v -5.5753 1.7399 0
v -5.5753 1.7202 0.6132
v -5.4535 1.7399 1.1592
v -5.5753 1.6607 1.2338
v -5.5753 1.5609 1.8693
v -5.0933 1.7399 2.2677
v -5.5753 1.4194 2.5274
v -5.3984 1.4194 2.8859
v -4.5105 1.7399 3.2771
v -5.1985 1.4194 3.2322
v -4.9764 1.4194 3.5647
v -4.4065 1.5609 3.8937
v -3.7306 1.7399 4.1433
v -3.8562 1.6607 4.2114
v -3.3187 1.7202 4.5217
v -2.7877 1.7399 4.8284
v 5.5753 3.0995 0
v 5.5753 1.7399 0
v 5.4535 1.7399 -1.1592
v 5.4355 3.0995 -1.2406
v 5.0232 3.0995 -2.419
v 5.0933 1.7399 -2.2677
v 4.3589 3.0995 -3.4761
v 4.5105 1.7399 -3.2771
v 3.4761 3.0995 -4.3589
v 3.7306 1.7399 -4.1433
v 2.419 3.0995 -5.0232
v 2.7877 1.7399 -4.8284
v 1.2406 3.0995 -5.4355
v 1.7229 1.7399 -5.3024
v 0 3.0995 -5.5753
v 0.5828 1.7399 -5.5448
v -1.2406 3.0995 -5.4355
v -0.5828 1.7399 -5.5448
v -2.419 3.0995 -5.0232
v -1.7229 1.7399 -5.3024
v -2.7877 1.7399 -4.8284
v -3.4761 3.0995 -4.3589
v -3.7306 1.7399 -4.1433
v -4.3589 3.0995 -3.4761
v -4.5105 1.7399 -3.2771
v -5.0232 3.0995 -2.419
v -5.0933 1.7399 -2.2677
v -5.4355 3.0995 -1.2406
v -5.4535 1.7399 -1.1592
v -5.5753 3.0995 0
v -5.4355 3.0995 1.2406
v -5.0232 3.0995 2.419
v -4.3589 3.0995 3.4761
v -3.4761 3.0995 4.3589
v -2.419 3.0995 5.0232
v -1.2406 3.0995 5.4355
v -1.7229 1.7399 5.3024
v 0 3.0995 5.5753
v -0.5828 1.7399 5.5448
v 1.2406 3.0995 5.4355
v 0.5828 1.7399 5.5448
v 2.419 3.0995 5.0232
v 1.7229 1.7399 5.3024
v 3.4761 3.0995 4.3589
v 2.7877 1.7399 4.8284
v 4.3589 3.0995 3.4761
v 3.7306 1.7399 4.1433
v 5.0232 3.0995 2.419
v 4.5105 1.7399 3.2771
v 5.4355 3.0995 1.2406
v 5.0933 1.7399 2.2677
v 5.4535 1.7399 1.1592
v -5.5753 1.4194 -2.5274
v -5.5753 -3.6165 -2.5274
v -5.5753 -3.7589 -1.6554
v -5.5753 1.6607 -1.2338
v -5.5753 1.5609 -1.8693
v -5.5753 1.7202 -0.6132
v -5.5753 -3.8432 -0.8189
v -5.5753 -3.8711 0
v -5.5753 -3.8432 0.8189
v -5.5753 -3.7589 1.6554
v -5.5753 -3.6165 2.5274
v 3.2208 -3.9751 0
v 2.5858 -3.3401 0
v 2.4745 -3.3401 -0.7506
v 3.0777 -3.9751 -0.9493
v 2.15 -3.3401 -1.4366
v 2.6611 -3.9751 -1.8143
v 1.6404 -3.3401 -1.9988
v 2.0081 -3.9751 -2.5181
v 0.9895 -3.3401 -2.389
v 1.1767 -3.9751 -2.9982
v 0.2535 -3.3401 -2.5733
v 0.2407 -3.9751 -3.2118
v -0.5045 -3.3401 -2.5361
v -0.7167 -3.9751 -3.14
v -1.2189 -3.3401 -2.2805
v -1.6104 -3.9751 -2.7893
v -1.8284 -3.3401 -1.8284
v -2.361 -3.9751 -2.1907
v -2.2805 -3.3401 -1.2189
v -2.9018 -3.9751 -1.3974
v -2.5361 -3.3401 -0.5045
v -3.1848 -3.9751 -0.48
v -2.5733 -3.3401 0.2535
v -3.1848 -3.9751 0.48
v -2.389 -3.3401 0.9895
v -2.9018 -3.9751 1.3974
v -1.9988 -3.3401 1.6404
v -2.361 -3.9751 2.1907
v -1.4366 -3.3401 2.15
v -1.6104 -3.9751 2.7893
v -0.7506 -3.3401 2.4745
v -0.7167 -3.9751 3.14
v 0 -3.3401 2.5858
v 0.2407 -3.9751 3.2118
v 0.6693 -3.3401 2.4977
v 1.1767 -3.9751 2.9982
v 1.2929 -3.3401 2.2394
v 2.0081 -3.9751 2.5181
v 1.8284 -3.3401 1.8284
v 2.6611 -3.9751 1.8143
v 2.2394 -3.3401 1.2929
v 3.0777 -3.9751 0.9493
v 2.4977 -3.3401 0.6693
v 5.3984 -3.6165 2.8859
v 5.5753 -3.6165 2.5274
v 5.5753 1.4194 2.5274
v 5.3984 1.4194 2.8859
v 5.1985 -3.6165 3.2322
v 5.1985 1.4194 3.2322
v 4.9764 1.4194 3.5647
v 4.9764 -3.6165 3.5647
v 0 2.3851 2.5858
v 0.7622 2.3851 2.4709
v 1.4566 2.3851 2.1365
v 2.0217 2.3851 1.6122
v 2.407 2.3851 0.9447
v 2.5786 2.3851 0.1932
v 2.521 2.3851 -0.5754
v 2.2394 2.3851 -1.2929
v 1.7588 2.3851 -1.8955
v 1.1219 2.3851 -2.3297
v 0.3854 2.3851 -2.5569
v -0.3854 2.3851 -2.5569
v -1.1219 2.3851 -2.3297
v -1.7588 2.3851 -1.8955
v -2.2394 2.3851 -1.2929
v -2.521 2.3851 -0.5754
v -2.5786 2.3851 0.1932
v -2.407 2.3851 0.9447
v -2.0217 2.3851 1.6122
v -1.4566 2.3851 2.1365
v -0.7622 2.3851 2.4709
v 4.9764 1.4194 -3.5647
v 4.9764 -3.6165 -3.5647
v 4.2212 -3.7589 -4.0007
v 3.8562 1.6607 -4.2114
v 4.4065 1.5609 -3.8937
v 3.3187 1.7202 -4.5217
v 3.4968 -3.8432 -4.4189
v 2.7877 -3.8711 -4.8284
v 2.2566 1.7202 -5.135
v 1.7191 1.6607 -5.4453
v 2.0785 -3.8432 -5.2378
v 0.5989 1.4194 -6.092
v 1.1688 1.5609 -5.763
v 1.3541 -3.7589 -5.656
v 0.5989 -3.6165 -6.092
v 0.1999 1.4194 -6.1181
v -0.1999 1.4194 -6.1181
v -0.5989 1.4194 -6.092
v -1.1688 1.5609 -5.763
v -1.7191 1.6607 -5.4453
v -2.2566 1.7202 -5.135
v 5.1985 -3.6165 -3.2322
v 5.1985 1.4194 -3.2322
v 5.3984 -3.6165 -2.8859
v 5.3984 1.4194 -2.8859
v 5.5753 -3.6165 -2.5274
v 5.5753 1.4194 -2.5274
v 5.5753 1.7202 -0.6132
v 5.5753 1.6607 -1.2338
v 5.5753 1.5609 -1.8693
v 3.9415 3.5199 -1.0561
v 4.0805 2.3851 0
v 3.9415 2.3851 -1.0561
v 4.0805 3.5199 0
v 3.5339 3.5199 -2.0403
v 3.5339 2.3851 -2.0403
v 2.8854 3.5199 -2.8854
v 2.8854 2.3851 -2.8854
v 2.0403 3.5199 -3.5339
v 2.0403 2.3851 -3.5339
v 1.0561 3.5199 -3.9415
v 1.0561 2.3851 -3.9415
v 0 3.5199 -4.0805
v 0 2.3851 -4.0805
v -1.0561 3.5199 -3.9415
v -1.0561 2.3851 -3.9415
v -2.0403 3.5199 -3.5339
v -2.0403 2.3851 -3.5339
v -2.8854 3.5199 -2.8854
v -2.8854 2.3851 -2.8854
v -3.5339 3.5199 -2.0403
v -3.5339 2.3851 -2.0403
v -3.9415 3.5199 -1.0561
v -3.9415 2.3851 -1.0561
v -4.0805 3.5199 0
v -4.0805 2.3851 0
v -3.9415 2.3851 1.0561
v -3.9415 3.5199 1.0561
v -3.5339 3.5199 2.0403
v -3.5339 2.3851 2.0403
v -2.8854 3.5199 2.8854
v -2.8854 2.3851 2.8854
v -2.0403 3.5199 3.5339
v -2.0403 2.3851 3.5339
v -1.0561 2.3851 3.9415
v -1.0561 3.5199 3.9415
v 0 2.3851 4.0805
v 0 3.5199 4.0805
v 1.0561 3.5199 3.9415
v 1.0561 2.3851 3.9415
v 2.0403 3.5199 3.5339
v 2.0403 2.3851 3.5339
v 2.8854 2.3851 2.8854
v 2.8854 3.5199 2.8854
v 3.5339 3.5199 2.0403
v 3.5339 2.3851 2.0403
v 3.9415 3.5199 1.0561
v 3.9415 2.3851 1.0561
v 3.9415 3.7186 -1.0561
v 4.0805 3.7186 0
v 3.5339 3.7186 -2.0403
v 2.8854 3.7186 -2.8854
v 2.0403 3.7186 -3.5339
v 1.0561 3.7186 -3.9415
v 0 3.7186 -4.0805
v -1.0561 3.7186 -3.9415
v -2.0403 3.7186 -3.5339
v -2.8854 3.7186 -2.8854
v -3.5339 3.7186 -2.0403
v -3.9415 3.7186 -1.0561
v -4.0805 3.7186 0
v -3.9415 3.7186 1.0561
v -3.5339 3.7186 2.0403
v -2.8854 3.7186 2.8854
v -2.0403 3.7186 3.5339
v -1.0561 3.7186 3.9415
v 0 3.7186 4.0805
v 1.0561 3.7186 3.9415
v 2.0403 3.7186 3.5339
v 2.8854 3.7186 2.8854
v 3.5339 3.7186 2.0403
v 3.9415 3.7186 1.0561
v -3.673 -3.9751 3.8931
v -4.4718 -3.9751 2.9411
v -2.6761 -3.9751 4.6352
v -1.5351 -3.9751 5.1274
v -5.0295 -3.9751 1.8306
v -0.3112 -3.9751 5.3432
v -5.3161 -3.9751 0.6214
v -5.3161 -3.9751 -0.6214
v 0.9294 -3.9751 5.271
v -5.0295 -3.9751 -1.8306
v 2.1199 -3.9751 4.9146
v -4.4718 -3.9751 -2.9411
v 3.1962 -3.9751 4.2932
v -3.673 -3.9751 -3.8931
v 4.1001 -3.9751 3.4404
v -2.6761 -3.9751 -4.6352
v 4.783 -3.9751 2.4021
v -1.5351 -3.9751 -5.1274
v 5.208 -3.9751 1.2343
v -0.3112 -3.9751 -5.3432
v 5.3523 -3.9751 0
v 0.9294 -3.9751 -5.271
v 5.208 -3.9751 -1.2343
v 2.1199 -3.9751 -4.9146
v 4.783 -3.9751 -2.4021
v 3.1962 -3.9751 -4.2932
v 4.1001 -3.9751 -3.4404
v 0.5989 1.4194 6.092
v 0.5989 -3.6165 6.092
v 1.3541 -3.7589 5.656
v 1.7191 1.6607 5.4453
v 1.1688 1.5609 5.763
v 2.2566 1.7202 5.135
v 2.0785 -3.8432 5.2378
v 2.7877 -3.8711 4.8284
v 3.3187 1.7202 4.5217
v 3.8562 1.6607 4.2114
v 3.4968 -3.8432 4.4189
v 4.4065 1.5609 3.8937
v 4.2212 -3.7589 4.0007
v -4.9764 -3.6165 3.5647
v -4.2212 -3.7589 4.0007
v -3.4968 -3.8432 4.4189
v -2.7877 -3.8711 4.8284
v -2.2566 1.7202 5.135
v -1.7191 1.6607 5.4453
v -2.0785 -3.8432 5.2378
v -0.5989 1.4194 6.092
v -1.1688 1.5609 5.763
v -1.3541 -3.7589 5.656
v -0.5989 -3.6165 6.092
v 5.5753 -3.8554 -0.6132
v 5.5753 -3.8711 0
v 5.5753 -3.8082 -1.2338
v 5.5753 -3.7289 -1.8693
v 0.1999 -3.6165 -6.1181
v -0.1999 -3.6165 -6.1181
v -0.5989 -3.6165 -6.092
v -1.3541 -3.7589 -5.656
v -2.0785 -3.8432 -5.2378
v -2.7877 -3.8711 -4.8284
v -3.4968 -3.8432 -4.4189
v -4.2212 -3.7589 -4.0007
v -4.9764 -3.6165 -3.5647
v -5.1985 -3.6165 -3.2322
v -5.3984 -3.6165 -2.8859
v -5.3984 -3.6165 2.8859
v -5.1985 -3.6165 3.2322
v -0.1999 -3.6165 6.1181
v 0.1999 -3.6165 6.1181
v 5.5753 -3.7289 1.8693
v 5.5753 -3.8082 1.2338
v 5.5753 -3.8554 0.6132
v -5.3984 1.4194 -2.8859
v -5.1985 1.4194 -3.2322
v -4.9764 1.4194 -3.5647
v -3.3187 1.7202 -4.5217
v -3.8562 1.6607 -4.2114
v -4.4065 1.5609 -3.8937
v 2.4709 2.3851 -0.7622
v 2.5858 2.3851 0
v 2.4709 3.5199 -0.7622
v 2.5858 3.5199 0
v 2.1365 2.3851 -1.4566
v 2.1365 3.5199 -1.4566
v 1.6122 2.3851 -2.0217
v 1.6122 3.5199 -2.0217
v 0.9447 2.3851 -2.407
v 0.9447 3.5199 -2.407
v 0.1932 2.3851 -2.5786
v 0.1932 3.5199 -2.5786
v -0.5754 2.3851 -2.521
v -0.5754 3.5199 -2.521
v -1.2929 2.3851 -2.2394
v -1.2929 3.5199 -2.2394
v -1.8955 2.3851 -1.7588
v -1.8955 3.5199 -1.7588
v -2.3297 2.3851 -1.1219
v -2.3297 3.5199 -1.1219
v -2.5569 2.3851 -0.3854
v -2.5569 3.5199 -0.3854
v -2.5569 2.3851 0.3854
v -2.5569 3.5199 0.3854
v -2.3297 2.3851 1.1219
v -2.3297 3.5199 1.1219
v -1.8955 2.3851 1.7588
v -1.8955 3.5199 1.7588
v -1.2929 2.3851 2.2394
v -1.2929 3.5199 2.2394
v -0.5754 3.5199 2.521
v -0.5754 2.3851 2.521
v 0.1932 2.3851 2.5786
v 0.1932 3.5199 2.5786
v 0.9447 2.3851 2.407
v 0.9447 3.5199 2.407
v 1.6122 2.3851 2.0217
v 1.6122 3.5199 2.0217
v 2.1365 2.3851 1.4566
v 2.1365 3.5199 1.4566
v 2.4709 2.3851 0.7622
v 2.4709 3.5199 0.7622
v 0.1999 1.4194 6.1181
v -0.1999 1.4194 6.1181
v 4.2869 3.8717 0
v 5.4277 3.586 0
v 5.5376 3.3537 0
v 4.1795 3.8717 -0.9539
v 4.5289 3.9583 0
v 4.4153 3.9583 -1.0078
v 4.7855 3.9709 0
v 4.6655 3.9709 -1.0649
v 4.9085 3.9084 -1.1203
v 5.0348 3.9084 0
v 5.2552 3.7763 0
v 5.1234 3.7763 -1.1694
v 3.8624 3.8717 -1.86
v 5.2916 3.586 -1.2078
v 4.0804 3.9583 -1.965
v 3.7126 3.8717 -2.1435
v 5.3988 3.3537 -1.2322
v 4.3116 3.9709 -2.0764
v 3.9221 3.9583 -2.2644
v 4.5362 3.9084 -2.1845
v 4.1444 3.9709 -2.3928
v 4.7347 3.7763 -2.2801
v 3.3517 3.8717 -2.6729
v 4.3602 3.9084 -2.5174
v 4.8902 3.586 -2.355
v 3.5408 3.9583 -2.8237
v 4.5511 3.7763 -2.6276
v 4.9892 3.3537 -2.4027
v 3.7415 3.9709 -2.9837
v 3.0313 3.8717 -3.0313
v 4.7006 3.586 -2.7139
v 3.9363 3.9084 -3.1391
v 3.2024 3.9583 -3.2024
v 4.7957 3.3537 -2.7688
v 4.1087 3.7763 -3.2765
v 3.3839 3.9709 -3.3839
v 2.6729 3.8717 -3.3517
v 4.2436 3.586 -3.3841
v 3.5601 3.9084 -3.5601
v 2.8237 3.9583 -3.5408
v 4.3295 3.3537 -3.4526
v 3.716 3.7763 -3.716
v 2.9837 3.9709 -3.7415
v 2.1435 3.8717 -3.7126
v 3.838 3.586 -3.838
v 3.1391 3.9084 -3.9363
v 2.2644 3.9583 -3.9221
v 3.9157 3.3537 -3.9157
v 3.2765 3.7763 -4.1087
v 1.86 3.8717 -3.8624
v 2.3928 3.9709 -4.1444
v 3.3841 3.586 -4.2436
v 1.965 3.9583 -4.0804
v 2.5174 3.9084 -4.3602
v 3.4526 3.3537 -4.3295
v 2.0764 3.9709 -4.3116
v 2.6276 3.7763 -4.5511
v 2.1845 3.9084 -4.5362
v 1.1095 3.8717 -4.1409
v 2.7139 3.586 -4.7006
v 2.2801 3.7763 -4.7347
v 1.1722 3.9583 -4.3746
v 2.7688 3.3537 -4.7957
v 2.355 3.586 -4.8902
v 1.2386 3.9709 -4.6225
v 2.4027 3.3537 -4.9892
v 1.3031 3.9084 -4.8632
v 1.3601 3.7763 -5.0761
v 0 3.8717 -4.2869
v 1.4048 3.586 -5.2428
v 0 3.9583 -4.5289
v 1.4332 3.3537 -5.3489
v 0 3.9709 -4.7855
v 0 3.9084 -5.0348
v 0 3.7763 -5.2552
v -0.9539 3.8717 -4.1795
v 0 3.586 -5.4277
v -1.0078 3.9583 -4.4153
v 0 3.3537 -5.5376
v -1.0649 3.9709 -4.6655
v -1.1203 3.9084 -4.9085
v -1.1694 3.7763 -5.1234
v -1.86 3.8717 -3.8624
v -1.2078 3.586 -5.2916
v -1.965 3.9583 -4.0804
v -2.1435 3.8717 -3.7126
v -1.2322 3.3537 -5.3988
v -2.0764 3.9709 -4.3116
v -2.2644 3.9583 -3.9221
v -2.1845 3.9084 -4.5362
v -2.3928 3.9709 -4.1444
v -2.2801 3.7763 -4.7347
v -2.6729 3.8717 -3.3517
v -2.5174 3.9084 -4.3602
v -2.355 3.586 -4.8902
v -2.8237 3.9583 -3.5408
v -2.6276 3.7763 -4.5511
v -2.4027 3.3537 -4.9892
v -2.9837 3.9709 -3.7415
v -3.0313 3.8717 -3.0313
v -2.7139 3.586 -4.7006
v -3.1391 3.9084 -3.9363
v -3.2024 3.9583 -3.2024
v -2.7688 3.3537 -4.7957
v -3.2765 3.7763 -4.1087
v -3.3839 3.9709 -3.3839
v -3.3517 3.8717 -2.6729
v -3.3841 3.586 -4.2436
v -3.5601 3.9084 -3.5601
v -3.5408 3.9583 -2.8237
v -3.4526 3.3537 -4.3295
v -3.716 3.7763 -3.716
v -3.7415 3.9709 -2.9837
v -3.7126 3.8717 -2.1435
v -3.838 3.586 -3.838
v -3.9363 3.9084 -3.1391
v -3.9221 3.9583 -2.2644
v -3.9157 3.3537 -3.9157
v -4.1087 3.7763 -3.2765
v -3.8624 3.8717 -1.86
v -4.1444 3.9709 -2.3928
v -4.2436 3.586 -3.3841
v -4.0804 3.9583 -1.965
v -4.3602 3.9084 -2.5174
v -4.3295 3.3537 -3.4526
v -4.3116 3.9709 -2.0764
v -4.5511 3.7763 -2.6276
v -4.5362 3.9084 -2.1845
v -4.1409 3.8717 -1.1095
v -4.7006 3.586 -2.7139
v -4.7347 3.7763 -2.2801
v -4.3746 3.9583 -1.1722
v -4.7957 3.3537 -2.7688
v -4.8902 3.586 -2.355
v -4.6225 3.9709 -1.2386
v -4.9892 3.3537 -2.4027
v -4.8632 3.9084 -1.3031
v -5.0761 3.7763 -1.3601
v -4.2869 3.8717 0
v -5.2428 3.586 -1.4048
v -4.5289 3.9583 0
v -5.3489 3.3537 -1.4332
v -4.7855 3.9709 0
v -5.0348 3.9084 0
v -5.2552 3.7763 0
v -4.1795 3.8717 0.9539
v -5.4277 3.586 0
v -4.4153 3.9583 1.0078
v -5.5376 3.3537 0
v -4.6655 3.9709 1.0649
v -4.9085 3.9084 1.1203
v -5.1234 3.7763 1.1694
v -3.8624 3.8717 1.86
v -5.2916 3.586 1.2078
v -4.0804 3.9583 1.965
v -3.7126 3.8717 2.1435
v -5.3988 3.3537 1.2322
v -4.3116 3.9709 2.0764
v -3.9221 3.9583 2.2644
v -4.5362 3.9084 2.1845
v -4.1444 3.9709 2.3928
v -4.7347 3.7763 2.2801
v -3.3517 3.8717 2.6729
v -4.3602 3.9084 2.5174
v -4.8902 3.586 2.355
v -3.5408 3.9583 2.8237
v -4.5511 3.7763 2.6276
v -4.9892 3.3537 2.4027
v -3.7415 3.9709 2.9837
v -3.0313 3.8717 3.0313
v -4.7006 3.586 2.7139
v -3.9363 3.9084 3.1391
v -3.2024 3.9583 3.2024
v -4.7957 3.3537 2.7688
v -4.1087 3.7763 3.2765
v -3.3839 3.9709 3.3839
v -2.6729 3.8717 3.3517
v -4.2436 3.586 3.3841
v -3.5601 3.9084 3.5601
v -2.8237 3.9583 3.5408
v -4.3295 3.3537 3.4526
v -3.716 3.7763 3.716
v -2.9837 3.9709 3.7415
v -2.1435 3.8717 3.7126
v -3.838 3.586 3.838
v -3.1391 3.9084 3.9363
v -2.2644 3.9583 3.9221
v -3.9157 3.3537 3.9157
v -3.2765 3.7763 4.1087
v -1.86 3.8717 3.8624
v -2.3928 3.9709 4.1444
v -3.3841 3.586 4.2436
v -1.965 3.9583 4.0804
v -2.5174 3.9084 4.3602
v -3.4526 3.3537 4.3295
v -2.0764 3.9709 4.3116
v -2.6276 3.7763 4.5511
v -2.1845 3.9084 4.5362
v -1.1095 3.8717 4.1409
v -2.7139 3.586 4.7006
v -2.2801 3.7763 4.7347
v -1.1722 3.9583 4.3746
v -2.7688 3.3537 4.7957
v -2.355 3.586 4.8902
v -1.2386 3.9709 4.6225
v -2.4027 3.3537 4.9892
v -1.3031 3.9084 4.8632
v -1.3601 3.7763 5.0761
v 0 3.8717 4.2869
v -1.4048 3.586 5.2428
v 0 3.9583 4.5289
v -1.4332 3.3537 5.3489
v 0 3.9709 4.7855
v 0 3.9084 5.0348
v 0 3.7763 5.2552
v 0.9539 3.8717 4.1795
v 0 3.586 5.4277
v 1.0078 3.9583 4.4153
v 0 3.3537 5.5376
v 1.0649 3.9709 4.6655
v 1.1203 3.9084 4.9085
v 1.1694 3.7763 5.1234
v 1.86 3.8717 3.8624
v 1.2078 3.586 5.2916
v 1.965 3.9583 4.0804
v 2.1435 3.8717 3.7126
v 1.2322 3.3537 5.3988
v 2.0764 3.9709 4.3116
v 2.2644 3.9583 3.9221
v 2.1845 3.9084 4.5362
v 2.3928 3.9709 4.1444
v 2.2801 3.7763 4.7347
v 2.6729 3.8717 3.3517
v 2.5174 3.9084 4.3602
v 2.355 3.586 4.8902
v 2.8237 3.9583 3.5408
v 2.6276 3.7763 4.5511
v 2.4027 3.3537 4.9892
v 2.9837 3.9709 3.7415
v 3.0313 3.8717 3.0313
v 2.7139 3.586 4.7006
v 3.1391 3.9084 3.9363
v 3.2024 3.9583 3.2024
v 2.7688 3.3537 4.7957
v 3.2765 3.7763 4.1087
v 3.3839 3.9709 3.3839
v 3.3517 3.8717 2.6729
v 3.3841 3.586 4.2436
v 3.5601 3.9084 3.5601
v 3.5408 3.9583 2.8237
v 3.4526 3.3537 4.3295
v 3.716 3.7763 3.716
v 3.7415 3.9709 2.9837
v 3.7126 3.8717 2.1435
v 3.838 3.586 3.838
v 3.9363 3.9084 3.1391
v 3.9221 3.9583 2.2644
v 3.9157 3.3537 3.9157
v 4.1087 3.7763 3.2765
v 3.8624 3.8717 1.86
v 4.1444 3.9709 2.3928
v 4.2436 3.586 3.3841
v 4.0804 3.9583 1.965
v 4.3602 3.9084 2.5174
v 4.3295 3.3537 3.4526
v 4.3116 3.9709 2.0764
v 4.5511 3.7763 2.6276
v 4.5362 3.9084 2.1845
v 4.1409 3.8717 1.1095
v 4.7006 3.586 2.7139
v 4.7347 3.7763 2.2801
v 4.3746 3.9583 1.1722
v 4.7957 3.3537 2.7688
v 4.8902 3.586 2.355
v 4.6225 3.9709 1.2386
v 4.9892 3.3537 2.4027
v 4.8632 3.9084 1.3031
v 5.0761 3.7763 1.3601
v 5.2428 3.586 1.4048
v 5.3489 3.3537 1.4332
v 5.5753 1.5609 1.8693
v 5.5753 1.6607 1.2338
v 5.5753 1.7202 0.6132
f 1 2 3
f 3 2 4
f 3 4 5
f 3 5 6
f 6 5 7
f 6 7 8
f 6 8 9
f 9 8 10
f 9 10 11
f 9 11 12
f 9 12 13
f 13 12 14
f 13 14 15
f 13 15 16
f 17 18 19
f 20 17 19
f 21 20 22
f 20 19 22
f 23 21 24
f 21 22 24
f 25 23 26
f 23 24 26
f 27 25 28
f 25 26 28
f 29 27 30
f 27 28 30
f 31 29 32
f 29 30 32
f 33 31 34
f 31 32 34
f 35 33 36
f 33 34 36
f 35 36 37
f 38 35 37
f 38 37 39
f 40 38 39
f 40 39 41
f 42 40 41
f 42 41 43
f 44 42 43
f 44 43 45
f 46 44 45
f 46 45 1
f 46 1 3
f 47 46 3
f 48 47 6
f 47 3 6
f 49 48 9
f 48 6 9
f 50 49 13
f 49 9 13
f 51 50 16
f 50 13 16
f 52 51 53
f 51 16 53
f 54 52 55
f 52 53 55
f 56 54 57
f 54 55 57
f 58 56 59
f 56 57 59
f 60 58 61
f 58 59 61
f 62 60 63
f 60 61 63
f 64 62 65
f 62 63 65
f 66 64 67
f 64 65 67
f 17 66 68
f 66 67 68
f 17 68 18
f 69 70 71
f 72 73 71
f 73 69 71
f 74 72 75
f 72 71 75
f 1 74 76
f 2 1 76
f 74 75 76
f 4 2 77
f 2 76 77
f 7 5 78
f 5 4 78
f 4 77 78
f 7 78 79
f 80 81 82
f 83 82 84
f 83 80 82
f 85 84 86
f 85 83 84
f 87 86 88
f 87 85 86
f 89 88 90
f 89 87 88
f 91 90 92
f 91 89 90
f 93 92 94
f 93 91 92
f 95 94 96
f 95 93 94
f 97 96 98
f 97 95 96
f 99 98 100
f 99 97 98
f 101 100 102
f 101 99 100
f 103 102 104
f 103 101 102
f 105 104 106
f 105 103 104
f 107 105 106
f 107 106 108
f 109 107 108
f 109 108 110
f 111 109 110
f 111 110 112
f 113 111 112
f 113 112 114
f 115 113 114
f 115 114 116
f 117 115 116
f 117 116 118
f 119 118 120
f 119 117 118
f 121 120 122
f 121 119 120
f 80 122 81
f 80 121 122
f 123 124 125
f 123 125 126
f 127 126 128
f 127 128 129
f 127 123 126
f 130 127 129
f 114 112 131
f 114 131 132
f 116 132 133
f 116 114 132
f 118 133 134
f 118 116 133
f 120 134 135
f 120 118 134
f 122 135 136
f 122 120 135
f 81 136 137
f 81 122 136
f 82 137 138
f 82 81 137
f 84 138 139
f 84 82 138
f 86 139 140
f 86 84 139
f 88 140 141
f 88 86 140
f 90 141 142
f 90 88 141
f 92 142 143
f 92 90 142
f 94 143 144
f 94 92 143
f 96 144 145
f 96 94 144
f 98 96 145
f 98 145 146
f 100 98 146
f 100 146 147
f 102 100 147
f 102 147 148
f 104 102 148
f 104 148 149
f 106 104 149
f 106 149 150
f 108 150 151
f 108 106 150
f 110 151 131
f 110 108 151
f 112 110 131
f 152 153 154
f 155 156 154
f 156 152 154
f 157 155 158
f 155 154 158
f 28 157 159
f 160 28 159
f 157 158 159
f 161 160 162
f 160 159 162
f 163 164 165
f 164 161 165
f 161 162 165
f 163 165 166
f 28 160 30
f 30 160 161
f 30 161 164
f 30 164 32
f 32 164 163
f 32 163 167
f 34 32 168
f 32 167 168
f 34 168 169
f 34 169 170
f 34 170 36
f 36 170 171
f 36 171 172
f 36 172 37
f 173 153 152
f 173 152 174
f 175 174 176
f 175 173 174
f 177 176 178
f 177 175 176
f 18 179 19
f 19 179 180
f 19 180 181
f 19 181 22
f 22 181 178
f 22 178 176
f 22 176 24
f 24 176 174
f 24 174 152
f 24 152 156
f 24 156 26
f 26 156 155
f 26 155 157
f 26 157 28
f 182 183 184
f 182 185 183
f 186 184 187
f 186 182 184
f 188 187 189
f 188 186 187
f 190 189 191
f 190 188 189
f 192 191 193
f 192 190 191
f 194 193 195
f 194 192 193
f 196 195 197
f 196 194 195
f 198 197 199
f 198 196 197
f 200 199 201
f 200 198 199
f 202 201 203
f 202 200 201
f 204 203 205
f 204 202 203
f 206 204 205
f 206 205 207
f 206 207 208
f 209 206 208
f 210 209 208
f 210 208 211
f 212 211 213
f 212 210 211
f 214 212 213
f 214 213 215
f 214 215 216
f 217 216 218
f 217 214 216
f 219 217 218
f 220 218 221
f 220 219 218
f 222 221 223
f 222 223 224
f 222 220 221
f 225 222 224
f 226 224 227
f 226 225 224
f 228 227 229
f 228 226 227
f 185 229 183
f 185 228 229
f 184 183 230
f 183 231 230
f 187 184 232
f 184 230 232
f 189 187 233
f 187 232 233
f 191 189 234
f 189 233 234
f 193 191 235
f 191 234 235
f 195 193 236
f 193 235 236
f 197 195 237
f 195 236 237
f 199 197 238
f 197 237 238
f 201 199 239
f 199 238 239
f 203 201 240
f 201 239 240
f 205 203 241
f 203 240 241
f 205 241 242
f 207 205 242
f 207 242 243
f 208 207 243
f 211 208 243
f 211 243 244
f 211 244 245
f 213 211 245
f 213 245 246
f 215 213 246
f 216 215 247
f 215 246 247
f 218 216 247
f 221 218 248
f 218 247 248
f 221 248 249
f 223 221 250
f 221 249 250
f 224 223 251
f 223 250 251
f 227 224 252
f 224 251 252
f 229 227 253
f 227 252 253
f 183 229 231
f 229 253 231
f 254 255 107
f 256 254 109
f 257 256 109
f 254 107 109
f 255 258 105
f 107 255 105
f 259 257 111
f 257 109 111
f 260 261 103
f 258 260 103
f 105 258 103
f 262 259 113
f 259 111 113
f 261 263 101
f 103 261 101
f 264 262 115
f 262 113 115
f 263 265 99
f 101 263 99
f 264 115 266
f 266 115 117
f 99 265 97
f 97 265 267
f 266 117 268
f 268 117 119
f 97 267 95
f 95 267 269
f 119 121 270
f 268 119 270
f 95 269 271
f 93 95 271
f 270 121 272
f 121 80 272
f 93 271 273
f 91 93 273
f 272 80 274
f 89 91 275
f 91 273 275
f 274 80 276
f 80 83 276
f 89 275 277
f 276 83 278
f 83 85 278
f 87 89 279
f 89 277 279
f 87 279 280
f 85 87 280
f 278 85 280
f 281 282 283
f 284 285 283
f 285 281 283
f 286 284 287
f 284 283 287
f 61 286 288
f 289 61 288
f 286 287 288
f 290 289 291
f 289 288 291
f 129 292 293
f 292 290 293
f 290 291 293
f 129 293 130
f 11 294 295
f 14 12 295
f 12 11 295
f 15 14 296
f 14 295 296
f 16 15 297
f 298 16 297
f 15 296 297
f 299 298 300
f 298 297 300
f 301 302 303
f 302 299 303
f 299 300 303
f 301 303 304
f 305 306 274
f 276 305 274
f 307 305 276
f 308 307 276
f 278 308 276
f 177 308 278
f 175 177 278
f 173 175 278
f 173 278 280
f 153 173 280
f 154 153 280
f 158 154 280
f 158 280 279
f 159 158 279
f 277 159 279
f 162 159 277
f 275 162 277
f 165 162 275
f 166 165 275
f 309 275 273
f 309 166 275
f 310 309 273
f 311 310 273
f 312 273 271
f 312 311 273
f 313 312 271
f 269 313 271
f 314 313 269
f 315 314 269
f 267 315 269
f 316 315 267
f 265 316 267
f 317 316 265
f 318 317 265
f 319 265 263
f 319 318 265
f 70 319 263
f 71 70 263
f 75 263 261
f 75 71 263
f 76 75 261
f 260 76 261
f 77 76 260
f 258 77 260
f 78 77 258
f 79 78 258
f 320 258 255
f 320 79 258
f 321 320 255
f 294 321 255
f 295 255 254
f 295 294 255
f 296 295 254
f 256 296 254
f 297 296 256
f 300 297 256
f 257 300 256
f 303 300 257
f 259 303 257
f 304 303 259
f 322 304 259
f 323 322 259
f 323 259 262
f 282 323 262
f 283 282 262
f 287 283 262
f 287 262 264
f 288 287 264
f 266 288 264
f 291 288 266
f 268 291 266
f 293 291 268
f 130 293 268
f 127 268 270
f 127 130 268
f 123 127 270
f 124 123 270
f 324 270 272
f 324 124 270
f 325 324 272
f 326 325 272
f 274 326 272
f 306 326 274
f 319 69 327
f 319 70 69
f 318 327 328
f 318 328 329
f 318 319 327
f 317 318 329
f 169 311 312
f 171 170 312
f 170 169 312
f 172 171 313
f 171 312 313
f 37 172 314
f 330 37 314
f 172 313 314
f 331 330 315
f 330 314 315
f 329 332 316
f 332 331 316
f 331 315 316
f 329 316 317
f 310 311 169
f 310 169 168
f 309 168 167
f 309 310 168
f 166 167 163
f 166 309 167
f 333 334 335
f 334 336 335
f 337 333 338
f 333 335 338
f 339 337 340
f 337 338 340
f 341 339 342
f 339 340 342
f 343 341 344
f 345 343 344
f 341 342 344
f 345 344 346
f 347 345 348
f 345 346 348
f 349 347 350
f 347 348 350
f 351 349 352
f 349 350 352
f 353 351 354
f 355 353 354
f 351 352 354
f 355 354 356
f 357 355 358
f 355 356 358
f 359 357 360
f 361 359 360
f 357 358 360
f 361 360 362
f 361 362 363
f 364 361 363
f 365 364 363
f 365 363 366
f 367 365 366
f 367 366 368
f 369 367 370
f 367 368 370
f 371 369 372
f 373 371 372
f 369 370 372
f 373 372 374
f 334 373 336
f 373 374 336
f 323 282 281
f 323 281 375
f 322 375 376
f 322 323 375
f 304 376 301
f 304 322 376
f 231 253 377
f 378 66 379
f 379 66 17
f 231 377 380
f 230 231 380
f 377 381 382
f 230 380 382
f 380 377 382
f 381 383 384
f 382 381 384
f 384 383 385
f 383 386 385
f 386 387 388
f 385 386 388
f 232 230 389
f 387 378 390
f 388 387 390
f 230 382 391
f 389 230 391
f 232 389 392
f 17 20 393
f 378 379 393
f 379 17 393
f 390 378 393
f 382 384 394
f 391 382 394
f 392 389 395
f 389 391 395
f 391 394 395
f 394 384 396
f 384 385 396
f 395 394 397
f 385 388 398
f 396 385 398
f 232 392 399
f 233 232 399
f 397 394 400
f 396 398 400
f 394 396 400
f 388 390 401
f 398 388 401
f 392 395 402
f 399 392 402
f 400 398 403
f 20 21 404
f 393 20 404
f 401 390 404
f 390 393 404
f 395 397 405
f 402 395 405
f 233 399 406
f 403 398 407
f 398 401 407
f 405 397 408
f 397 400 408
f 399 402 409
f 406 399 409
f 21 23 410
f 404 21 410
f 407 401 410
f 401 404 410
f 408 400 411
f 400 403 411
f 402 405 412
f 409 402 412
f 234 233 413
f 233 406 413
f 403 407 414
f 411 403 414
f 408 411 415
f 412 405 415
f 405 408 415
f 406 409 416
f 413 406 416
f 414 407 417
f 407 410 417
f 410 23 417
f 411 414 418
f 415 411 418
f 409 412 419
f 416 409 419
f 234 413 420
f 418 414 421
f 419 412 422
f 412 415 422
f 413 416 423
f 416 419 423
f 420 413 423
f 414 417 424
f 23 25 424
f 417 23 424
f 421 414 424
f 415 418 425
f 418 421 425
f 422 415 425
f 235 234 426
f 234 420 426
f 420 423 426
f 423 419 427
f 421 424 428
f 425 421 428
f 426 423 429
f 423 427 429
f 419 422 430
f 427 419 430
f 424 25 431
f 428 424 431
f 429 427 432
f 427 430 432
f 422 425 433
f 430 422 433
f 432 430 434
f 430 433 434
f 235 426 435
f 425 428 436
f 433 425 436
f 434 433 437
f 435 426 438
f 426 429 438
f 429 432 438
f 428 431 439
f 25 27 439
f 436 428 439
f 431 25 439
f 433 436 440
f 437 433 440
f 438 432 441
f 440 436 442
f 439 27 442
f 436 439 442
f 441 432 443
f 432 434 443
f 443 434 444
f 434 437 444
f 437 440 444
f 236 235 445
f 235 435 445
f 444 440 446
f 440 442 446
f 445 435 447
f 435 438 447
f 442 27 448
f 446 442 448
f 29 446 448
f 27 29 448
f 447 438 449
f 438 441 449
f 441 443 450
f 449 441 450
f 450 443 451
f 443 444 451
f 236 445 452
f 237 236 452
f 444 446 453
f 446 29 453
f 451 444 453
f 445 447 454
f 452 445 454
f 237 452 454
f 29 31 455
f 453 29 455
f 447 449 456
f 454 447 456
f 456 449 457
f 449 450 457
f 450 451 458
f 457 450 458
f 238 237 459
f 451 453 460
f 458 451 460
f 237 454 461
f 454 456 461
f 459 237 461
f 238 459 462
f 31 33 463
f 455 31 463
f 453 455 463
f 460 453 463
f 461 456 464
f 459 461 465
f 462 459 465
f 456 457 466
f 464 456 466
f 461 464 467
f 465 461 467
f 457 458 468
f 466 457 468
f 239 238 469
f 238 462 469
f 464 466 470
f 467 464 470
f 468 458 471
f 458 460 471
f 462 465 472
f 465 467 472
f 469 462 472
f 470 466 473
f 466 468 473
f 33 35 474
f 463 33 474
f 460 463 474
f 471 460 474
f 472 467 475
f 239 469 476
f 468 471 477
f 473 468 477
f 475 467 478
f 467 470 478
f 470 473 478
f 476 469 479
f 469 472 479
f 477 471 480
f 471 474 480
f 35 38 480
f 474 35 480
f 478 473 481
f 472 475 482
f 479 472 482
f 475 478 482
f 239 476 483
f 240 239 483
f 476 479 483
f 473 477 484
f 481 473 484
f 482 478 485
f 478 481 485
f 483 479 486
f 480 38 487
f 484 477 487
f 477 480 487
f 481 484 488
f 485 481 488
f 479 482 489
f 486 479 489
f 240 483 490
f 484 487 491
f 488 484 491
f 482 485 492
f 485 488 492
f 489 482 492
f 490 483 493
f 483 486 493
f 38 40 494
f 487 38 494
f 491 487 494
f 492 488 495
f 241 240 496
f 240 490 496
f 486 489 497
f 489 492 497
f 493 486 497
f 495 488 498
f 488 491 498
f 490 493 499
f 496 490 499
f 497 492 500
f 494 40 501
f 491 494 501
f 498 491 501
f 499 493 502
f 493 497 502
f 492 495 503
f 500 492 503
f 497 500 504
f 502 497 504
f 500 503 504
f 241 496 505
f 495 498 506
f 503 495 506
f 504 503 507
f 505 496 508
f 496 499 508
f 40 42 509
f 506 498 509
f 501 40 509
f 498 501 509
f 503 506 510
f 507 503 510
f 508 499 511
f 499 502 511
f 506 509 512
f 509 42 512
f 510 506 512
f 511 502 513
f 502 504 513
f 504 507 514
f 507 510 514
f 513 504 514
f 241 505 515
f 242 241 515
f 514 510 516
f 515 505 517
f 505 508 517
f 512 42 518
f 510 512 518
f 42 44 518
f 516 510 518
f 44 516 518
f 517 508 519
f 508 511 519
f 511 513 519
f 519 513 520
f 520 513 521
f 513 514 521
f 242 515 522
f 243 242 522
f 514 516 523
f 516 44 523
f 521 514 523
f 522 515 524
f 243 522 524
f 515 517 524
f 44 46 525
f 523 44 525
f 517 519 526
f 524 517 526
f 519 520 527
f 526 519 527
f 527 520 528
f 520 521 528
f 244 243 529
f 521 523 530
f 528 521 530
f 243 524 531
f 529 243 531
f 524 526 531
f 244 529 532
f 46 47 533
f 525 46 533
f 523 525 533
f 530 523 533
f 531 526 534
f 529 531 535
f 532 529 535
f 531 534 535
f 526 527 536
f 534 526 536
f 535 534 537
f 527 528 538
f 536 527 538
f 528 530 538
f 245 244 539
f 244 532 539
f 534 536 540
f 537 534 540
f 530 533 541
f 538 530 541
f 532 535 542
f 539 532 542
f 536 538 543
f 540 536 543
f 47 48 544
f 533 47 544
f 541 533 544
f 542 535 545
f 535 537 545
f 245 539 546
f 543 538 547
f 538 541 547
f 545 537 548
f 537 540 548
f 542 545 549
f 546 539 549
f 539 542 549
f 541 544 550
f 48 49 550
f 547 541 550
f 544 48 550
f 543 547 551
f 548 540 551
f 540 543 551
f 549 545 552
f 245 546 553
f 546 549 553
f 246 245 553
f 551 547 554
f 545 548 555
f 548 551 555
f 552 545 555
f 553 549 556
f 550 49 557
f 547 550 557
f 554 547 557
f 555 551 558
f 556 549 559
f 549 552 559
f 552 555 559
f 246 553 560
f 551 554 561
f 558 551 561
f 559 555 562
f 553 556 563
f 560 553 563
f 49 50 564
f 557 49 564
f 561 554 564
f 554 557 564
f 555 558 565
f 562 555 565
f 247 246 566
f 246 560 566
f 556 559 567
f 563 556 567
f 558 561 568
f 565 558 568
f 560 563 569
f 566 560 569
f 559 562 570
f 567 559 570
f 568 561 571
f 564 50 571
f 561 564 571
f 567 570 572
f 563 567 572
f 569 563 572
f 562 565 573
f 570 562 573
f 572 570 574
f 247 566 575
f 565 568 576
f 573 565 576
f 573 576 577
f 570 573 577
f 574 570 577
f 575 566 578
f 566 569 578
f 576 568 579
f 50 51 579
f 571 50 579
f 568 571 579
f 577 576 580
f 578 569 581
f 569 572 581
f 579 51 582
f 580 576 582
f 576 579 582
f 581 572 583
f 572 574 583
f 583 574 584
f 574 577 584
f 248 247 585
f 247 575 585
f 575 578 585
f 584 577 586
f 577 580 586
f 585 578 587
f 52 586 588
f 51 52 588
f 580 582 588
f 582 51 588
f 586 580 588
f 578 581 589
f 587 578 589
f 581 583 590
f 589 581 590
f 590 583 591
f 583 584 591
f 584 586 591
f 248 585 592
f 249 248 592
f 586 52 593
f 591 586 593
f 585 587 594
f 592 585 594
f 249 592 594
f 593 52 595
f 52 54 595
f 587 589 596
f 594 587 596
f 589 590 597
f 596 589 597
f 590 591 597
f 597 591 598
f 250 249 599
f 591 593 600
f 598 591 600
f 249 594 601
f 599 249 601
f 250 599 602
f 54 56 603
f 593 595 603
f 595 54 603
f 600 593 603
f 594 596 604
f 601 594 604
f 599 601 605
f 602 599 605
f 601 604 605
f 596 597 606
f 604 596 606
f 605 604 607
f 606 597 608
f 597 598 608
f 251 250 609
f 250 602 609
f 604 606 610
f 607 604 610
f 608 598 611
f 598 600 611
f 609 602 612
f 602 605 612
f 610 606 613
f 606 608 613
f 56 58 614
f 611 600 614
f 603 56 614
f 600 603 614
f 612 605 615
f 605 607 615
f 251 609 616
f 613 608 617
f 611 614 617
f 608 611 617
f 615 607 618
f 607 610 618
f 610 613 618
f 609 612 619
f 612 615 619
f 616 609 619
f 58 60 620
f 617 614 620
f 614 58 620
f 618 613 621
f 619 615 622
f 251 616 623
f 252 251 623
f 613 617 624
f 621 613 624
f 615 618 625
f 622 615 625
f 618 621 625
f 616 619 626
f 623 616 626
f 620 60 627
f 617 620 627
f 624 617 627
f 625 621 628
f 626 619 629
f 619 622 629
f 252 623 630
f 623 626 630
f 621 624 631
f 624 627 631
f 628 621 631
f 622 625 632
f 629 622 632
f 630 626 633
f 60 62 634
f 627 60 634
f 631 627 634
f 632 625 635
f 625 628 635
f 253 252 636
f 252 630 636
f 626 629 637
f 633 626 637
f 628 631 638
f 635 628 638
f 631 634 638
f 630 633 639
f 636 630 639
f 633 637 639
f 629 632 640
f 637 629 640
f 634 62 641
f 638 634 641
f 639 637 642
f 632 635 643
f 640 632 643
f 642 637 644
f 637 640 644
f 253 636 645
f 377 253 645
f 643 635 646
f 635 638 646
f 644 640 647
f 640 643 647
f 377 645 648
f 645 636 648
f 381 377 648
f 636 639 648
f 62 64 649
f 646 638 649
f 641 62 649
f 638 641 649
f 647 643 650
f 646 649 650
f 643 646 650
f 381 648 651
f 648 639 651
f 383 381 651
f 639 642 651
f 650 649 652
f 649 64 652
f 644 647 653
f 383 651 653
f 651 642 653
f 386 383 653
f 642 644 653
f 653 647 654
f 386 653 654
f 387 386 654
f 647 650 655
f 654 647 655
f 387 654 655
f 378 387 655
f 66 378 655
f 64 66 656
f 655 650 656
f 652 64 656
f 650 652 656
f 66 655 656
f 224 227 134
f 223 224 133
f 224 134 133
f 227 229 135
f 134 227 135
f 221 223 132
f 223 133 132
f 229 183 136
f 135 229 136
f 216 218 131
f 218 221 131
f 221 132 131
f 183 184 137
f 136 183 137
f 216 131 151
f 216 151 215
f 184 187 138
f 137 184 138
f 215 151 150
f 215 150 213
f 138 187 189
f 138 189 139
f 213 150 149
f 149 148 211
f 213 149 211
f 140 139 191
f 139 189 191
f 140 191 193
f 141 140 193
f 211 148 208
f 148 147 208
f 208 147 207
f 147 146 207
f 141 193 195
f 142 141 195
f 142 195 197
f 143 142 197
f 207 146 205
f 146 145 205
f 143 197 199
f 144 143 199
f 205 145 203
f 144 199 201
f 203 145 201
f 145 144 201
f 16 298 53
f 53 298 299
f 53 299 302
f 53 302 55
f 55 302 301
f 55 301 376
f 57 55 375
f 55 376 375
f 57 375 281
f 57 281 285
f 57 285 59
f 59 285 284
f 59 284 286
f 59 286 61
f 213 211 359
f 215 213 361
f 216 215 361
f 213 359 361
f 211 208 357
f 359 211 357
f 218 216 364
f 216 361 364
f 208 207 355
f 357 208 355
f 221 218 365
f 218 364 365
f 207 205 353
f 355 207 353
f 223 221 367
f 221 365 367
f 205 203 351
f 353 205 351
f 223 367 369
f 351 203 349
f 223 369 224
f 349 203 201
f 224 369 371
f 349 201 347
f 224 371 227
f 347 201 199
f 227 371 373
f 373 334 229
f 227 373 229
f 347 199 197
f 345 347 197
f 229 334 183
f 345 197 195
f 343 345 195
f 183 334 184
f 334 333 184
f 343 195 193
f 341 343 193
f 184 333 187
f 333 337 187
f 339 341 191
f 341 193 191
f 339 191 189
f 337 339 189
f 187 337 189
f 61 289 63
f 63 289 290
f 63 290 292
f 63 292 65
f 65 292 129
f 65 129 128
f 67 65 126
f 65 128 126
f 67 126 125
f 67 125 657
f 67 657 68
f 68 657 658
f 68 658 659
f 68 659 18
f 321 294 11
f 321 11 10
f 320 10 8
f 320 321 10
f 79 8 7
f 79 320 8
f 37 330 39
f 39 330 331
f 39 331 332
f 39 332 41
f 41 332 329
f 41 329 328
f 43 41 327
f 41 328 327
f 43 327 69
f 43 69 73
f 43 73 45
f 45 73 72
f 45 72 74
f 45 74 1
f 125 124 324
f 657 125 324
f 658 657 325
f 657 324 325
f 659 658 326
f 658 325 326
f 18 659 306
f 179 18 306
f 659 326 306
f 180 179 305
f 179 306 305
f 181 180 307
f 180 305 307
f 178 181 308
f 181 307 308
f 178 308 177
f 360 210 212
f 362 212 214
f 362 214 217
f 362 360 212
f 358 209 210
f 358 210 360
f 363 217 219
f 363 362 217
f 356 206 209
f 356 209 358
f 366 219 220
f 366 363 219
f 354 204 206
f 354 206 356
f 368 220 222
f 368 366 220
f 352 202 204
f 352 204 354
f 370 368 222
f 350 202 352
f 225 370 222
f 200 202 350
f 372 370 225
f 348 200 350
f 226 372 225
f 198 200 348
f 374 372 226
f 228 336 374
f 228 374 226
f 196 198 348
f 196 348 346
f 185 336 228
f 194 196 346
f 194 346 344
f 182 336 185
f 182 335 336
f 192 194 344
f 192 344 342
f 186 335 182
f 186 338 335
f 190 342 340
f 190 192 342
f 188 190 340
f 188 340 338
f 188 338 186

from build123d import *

# Parameters (mm, degrees)
BOSS_EXTRUDE1_DEPTH      = 3.9751
BOSS_EXTRUDE1_DEPTH_BACK = 3.9751
SKETCH2_R                = 2.585793431
SKETCH4_W                = 1.494753284
SKETCH4_H                = 1.134825881
SKETCH11_OUTSIDE_W       = 16.91
SKETCH11_OUTSIDE_H       = 18.636
SKETCH11_OUTSIDE_R       = 6.1214
CUT_EXTRUDE1_DEPTH       = 12.650534115


with BuildPart() as part:
    # Sketch2 → Boss-Extrude1 (new, two sides: drawn at the far end of the back side and taken through both)
    with BuildSketch(Plane(origin=(0, 0, 0), x_dir=(1, 0, 0), z_dir=(0, 1, 0)).offset(-BOSS_EXTRUDE1_DEPTH_BACK)):
        Polygon((0, 6.437801912), (-5.5753, 3.218900956), (-5.5753, -3.218900956), (0, -6.437801912), (5.5753, -3.218900956), (5.5753, 3.218900956), align=None)
        with Locations(Location((0, 0, 0), (0, 0, 270))):
            Circle(SKETCH2_R, mode=Mode.SUBTRACT)
    extrude(amount=BOSS_EXTRUDE1_DEPTH + BOSS_EXTRUDE1_DEPTH_BACK)

    # Sketch3 → Cut-Revolve2 (revolve, cut)
    with BuildSketch(Plane(origin=(0, 0, 0), x_dir=(0, 0, -1), z_dir=(1, 0, 0)), mode=Mode.PRIVATE) as cut_revolve2_sk:
        with BuildLine():
            Line((6.437801912, 1.7399), (6.437801912, 4.9751))
            Line((6.437801912, 4.9751), (2.585793431, 4.9751))
            Line((2.585793431, 4.9751), (2.585793431, 2.38506))
            Line((2.585793431, 2.38506), (4.080546715, 2.38506))
            Line((4.080546715, 2.38506), (4.080546715, 3.718640881))
            ThreePointArc((4.080546715, 3.718640881), (5.034773785, 3.908448447), (5.5753, 3.099493798))
            Line((5.5753, 3.099493798), (5.5753, 1.7399))
            Line((5.5753, 1.7399), (6.437801912, 1.23371655))
            Line((6.437801912, 1.23371655), (6.437801912, 1.7399))
        make_face()
        Polygon((5.352288, -3.9751), (6.437801912, -3.46891655), (6.437801912, -3.9751), align=None)
        Polygon((2.585793431, -3.9751), (2.585793431, -3.3401), (3.220793431, -3.9751), align=None)
    revolve(cut_revolve2_sk.sketch.rotate(Axis((0, -3.9751, 0), (0, 1, 0)), 270), axis=Axis((0, -3.9751, 0), (0, 1, 0)), mode=Mode.SUBTRACT)

    # Sketch11 outside → Cut-Extrude1 (cut, through all)
    with BuildSketch(Plane.XZ.offset(3.9751)):
        Rectangle(SKETCH11_OUTSIDE_W, SKETCH11_OUTSIDE_H)
        Circle(SKETCH11_OUTSIDE_R, mode=Mode.SUBTRACT)
    extrude(amount=-CUT_EXTRUDE1_DEPTH, mode=Mode.SUBTRACT)


with BuildPart() as body_2:
    # Sketch4 → Revolve1 (revolve)
    with BuildSketch(Plane(origin=(0, 0, 0), x_dir=(0, 0, -1), z_dir=(1, 0, 0)), mode=Mode.PRIVATE) as revolve1_sk:
        with Locations((-3.333170073, 2.952472941)):
            Rectangle(SKETCH4_W, SKETCH4_H)
    revolve(revolve1_sk.sketch.rotate(Axis((0, -3.9751, 0), (0, 1, 0)), 90), axis=Axis((0, -3.9751, 0), (0, 1, 0)))


solid = Compound([part.part, body_2.part])
